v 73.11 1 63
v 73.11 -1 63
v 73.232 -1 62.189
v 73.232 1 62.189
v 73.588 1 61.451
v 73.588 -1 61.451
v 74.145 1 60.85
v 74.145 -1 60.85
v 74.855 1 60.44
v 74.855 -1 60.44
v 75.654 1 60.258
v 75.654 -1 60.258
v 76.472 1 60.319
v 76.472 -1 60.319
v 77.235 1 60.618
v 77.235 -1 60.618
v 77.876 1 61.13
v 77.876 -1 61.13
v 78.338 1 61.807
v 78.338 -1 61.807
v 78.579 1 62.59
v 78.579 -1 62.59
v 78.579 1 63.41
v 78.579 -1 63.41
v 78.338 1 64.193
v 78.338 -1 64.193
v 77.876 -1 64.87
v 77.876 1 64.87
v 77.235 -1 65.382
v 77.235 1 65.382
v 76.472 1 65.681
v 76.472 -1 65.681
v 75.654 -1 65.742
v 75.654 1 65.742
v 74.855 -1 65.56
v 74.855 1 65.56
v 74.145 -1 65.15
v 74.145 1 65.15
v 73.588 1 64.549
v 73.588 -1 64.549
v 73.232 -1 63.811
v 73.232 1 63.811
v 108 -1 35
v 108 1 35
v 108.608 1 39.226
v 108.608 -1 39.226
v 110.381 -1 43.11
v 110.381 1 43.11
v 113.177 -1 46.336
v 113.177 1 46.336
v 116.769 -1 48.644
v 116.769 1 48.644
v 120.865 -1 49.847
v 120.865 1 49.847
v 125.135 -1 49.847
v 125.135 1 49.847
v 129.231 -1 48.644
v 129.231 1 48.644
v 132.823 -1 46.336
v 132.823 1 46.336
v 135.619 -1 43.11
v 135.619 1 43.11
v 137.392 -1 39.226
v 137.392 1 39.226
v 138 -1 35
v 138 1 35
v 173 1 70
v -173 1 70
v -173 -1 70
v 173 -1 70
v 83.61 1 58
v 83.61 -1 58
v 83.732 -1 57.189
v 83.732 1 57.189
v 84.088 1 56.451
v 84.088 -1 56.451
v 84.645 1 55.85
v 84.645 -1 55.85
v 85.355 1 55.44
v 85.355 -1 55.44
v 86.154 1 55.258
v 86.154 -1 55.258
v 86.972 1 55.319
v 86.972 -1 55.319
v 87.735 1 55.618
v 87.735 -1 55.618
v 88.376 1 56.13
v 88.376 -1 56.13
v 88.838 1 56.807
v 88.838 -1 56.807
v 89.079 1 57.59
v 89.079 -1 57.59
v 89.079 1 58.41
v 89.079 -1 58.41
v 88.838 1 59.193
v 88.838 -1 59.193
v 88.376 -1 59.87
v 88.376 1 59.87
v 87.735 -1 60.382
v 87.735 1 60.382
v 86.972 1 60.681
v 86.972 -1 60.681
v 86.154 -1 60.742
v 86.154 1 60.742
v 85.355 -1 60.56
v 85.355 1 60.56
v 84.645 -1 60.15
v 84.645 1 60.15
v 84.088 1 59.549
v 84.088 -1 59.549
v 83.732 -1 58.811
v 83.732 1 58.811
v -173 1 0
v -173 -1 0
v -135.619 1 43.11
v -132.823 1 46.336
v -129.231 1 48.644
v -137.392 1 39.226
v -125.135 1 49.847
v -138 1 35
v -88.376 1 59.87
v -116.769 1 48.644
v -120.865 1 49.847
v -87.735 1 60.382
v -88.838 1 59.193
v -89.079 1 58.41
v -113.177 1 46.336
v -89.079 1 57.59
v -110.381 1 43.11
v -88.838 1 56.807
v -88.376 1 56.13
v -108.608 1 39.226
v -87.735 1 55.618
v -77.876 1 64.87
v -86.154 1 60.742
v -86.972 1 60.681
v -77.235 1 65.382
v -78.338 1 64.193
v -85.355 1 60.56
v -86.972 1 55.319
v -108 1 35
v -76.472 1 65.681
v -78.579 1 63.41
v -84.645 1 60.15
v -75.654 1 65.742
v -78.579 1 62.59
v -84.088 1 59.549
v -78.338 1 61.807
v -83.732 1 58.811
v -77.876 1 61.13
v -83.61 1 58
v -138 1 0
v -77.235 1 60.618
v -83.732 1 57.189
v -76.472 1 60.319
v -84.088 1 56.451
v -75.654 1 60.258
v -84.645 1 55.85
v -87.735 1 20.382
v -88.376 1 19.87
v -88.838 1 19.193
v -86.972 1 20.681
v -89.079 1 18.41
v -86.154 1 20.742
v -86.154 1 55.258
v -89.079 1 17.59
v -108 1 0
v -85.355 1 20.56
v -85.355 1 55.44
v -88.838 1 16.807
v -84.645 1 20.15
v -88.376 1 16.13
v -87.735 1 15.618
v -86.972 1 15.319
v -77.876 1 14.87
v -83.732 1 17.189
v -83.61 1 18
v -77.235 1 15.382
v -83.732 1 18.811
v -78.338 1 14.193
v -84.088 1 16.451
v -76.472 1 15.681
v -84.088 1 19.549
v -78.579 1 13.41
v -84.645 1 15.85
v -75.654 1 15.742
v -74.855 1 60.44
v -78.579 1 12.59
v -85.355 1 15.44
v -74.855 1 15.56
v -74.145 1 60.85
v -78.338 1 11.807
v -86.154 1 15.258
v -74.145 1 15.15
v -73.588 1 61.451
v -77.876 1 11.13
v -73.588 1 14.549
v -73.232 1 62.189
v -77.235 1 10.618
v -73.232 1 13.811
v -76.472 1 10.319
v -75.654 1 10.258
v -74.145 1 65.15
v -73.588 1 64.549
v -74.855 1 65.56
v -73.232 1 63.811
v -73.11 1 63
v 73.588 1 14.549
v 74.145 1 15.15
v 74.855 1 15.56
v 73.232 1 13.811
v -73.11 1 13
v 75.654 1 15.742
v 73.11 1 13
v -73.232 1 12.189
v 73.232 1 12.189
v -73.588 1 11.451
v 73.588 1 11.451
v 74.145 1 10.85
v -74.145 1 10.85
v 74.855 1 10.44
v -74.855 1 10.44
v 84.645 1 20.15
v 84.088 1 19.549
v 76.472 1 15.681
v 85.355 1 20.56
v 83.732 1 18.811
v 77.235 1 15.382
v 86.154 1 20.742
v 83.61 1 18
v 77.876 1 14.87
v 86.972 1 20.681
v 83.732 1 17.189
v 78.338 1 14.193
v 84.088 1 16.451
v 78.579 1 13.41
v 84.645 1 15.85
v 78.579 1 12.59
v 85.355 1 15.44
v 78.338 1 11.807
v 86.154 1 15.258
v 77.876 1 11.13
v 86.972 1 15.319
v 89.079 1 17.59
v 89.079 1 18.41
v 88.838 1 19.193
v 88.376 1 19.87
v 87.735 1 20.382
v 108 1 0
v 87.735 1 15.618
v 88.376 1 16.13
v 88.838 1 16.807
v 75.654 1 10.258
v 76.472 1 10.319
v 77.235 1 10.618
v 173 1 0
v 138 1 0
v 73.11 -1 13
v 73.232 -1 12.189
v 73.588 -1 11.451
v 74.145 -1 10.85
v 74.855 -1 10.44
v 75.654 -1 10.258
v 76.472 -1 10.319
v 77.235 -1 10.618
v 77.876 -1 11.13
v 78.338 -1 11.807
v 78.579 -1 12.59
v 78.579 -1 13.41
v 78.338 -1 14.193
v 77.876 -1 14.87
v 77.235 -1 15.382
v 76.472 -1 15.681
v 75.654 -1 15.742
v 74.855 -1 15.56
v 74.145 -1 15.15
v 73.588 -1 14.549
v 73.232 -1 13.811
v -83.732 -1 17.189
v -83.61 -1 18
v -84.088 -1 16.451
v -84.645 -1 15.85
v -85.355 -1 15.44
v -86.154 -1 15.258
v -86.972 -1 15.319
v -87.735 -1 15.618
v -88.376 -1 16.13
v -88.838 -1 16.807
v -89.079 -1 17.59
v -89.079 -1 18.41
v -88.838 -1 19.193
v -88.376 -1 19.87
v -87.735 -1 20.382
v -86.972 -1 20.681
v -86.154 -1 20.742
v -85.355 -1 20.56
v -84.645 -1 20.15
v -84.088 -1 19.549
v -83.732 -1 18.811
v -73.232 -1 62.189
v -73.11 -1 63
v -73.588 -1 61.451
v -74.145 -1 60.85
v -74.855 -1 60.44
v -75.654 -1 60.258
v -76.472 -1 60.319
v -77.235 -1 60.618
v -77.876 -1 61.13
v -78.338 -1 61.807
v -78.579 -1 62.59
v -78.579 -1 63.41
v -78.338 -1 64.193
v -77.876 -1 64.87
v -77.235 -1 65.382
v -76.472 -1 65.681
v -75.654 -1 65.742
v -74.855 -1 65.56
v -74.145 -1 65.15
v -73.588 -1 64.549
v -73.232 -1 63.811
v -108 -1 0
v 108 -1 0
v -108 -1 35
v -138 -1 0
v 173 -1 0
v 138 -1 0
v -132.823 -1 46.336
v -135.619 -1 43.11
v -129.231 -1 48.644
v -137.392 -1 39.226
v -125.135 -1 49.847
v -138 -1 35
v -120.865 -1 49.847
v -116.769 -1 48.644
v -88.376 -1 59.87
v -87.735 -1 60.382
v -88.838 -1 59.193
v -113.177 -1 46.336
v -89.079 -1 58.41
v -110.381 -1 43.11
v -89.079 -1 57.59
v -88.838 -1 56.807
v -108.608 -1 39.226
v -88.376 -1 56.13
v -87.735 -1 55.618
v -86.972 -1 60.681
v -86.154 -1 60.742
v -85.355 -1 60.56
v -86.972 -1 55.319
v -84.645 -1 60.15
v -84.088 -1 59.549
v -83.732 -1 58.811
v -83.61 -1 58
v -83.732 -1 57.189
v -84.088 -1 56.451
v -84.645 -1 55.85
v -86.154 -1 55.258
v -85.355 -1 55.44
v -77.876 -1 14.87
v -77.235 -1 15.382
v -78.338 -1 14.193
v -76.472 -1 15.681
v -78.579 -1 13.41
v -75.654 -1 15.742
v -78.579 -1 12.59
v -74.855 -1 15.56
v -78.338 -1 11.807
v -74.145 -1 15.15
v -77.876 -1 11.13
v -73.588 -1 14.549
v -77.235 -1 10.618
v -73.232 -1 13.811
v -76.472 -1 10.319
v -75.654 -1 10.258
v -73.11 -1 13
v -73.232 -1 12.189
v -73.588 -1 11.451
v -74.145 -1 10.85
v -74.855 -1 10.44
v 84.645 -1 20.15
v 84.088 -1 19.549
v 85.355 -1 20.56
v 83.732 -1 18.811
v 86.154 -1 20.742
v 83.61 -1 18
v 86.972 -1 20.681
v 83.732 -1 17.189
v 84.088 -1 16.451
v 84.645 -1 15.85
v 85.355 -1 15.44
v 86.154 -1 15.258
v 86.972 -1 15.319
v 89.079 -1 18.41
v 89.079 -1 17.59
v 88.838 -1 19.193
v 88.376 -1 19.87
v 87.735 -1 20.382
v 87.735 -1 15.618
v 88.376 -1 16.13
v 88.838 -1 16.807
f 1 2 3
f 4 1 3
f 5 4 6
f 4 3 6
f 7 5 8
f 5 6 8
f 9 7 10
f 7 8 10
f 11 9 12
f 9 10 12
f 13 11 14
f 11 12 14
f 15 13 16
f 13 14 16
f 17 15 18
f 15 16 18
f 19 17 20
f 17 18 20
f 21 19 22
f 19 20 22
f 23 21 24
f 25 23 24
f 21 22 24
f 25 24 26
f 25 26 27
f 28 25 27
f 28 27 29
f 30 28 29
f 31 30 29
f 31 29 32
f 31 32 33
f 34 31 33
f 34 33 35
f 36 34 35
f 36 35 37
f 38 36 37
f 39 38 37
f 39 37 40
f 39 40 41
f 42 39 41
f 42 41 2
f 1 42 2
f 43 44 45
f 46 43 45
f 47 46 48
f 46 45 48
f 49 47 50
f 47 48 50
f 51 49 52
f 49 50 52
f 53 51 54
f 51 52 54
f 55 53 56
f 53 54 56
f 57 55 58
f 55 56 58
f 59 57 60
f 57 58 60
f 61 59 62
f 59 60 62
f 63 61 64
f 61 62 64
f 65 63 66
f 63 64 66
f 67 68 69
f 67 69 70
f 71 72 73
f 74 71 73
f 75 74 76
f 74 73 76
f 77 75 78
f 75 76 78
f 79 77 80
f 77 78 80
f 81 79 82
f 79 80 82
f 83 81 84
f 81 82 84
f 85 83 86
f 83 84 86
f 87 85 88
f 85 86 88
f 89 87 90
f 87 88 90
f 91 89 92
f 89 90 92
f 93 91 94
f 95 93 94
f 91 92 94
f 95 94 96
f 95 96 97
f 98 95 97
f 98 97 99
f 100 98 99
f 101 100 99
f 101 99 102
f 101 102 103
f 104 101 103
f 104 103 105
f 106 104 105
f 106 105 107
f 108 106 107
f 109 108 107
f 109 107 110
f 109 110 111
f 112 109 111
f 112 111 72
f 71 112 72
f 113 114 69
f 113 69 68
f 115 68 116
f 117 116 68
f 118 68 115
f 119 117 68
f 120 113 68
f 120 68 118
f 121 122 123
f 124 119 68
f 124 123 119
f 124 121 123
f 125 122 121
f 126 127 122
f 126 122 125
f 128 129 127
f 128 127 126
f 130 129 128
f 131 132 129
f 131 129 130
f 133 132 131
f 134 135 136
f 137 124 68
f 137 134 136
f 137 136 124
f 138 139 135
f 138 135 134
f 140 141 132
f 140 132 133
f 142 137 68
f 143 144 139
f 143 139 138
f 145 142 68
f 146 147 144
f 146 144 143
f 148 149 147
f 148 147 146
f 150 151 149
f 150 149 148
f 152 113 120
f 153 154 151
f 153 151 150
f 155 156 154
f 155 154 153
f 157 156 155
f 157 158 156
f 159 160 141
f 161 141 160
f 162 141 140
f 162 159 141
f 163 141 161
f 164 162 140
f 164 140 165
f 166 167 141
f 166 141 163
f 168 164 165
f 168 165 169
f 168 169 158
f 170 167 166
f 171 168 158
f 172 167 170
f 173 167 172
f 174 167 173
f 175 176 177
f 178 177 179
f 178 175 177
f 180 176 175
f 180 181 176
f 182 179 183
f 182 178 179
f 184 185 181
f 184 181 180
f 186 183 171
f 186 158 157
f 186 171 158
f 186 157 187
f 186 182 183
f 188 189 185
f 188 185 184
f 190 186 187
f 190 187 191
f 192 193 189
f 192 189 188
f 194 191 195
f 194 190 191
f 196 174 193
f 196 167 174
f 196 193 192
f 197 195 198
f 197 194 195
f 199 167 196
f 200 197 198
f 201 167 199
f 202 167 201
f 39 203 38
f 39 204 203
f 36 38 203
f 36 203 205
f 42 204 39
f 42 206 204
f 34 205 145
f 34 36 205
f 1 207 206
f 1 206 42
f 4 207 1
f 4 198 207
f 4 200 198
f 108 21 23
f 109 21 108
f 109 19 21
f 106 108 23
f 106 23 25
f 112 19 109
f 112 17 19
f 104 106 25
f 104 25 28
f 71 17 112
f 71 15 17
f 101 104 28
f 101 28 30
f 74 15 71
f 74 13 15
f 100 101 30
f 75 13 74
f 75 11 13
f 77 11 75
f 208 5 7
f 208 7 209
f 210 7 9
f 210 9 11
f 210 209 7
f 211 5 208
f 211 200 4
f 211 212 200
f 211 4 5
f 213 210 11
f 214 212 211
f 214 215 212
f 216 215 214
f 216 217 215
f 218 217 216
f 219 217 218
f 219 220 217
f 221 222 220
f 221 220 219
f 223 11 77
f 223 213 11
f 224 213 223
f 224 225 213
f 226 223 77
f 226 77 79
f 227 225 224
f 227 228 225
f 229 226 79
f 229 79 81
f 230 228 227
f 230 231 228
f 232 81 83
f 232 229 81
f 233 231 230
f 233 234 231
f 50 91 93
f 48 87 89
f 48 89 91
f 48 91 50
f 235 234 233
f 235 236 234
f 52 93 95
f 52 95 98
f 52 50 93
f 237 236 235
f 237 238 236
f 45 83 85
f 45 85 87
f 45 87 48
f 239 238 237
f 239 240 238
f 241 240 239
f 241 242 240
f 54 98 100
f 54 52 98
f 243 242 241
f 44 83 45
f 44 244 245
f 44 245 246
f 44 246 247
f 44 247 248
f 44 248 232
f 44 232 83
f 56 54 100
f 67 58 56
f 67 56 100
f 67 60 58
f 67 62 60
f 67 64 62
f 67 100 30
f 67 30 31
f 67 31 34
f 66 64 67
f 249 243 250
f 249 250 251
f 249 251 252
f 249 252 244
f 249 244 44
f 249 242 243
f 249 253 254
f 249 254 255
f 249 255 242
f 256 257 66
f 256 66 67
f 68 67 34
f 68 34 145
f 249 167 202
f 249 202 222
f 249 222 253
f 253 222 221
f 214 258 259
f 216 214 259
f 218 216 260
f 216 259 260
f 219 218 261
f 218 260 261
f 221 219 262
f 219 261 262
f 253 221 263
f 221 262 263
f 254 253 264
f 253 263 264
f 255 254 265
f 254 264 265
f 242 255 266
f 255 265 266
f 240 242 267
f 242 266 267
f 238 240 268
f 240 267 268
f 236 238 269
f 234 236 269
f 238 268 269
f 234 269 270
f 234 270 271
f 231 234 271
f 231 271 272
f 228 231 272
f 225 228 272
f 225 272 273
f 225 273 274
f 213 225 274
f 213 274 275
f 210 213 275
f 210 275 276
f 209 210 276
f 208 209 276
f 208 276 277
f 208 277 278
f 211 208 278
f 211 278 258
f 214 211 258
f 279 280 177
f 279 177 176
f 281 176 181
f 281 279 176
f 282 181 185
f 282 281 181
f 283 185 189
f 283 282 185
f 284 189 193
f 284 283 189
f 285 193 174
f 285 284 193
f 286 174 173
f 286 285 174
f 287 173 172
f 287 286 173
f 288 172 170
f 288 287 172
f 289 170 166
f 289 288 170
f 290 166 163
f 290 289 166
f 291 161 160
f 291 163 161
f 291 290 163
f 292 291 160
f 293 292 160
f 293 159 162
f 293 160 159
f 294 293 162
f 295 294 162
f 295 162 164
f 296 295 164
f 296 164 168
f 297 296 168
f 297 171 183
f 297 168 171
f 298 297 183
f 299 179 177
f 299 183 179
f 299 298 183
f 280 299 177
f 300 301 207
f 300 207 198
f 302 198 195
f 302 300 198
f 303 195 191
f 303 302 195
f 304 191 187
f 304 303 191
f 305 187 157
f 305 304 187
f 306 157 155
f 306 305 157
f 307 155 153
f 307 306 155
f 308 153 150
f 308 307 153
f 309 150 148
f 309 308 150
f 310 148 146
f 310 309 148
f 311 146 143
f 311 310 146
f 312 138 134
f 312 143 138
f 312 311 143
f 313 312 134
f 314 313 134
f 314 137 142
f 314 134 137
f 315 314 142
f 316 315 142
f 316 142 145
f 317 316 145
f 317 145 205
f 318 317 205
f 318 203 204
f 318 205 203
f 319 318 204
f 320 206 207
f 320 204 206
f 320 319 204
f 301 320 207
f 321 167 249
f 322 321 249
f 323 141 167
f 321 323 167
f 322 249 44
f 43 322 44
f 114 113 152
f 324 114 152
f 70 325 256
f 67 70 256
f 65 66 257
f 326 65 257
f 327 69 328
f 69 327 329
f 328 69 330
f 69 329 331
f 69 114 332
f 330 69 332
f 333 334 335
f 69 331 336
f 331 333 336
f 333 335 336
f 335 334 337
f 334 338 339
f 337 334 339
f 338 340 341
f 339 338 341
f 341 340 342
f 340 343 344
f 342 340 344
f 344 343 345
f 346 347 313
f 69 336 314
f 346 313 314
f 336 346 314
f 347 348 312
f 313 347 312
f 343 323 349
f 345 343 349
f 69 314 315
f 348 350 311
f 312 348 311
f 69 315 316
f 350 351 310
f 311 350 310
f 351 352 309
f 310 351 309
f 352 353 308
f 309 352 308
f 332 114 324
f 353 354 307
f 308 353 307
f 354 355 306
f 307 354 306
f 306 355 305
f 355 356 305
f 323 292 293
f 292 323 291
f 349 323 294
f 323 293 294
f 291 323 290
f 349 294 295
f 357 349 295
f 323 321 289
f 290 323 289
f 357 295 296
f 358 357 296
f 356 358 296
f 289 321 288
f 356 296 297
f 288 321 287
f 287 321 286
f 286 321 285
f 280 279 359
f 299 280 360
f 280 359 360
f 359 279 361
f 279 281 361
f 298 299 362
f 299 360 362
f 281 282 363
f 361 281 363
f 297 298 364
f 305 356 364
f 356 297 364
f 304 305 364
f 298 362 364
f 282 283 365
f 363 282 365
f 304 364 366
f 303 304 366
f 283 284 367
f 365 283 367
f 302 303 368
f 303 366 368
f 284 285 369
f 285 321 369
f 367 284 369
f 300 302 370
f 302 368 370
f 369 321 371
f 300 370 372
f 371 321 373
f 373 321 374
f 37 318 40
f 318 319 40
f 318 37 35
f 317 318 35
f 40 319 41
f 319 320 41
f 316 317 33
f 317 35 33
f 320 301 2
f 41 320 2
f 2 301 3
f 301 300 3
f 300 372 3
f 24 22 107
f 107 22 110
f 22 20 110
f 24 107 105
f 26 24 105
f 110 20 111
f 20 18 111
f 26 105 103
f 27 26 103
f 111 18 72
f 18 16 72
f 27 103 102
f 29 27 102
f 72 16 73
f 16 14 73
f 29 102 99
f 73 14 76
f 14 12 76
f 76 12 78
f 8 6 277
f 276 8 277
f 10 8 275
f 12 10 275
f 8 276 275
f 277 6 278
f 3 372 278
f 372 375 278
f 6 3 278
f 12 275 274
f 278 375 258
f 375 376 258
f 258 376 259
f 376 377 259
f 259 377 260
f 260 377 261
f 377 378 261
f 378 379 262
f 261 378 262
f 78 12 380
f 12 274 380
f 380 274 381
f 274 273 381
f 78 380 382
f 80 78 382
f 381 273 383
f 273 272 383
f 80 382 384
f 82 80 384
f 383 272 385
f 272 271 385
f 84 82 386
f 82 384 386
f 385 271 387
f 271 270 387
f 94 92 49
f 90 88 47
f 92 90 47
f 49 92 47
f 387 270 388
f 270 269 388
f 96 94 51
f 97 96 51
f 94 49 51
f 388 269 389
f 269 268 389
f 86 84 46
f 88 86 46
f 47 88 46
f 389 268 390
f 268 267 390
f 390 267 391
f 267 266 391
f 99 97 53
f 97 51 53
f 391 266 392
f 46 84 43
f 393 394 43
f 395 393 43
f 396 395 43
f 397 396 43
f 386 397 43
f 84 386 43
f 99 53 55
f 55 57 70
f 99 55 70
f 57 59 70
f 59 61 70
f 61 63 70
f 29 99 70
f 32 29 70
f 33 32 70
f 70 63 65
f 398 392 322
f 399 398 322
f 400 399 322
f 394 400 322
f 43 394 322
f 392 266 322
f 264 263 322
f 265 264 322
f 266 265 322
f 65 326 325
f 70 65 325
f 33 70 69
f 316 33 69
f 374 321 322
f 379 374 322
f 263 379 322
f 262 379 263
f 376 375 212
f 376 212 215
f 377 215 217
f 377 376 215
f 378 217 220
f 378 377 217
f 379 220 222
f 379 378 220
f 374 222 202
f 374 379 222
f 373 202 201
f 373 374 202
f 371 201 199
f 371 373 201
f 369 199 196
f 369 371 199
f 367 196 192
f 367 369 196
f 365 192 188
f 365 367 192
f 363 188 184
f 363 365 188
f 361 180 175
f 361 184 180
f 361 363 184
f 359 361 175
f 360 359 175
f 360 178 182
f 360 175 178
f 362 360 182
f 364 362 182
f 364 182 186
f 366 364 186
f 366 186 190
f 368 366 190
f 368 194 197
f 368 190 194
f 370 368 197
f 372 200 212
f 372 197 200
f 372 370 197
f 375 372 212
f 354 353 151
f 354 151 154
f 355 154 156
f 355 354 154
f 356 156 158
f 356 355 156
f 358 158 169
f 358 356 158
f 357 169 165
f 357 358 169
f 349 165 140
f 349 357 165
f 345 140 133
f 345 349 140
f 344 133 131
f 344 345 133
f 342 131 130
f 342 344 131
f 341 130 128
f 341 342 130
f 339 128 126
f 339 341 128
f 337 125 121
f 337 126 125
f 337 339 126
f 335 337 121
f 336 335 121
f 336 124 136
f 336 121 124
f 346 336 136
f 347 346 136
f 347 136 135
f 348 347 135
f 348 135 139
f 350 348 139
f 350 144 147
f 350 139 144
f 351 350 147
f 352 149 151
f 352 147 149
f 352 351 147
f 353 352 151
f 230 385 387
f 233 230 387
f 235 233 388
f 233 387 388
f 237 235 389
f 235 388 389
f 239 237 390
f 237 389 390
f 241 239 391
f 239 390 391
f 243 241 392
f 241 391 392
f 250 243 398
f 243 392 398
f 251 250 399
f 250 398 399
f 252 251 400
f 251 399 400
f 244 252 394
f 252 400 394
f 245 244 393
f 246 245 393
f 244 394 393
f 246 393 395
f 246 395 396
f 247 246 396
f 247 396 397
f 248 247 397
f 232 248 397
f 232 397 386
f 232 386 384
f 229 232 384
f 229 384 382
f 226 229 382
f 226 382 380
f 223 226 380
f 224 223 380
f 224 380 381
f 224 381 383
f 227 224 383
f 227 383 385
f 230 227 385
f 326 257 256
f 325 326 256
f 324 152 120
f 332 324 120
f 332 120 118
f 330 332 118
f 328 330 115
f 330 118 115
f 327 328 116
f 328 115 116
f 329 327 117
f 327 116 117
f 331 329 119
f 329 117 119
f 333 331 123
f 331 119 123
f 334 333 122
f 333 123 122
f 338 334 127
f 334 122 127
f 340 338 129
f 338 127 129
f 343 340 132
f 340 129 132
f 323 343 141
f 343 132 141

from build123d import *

# Parameters (mm, degrees)
SKETCH1_W            = 346
SKETCH1_H            = 2
BOSS_EXTRUDE1_DEPTH  = 70
M5_CLEARANCE_HOLE1_D = 5.5
CUT_EXTRUDE1_DEPTH   = 10


with BuildPart() as part:
    # Sketch1 → Boss-Extrude1 (new body)
    with BuildSketch(Plane.XY):
        Rectangle(SKETCH1_W, SKETCH1_H)
    extrude(amount=BOSS_EXTRUDE1_DEPTH)

    # M5 Clearance Hole1 (through all)
    with Locations(Plane(origin=(86.36, 1, 18), x_dir=(1, 0, 0), z_dir=(0, 1, 0))):
        with Locations((0, 0), (-10.5, 5), (0, -40), (-10.5, -45)):
            m5_clearance_hole1 = Hole(M5_CLEARANCE_HOLE1_D / 2)

    # Mirror1: M5 Clearance Hole1 across plane
    add(m5_clearance_hole1.mirror(Plane(origin=(0, 0, 0), x_dir=(0, 0, 1), z_dir=(1, 0, 0))), mode=Mode.SUBTRACT)

    # Sketch4 → Cut-Extrude1 (cut)
    with BuildSketch(Plane(origin=(0, 1, 0), x_dir=(1, 0, 0), z_dir=(0, 1, 0))):
        with BuildLine():
            Line((138, -35), (138, 0))
            Line((138, 0), (108, 0))
            Line((108, 0), (108, -35))
            ThreePointArc((108, -35), (123, -50), (138, -35))
        make_face()
        with BuildLine():
            Line((-108, -35), (-108, 0))
            Line((-108, 0), (-138, 0))
            Line((-138, 0), (-138, -35))
            ThreePointArc((-138, -35), (-123, -50), (-108, -35))
        make_face()
    extrude(amount=-CUT_EXTRUDE1_DEPTH, mode=Mode.SUBTRACT)


solid = part.part
